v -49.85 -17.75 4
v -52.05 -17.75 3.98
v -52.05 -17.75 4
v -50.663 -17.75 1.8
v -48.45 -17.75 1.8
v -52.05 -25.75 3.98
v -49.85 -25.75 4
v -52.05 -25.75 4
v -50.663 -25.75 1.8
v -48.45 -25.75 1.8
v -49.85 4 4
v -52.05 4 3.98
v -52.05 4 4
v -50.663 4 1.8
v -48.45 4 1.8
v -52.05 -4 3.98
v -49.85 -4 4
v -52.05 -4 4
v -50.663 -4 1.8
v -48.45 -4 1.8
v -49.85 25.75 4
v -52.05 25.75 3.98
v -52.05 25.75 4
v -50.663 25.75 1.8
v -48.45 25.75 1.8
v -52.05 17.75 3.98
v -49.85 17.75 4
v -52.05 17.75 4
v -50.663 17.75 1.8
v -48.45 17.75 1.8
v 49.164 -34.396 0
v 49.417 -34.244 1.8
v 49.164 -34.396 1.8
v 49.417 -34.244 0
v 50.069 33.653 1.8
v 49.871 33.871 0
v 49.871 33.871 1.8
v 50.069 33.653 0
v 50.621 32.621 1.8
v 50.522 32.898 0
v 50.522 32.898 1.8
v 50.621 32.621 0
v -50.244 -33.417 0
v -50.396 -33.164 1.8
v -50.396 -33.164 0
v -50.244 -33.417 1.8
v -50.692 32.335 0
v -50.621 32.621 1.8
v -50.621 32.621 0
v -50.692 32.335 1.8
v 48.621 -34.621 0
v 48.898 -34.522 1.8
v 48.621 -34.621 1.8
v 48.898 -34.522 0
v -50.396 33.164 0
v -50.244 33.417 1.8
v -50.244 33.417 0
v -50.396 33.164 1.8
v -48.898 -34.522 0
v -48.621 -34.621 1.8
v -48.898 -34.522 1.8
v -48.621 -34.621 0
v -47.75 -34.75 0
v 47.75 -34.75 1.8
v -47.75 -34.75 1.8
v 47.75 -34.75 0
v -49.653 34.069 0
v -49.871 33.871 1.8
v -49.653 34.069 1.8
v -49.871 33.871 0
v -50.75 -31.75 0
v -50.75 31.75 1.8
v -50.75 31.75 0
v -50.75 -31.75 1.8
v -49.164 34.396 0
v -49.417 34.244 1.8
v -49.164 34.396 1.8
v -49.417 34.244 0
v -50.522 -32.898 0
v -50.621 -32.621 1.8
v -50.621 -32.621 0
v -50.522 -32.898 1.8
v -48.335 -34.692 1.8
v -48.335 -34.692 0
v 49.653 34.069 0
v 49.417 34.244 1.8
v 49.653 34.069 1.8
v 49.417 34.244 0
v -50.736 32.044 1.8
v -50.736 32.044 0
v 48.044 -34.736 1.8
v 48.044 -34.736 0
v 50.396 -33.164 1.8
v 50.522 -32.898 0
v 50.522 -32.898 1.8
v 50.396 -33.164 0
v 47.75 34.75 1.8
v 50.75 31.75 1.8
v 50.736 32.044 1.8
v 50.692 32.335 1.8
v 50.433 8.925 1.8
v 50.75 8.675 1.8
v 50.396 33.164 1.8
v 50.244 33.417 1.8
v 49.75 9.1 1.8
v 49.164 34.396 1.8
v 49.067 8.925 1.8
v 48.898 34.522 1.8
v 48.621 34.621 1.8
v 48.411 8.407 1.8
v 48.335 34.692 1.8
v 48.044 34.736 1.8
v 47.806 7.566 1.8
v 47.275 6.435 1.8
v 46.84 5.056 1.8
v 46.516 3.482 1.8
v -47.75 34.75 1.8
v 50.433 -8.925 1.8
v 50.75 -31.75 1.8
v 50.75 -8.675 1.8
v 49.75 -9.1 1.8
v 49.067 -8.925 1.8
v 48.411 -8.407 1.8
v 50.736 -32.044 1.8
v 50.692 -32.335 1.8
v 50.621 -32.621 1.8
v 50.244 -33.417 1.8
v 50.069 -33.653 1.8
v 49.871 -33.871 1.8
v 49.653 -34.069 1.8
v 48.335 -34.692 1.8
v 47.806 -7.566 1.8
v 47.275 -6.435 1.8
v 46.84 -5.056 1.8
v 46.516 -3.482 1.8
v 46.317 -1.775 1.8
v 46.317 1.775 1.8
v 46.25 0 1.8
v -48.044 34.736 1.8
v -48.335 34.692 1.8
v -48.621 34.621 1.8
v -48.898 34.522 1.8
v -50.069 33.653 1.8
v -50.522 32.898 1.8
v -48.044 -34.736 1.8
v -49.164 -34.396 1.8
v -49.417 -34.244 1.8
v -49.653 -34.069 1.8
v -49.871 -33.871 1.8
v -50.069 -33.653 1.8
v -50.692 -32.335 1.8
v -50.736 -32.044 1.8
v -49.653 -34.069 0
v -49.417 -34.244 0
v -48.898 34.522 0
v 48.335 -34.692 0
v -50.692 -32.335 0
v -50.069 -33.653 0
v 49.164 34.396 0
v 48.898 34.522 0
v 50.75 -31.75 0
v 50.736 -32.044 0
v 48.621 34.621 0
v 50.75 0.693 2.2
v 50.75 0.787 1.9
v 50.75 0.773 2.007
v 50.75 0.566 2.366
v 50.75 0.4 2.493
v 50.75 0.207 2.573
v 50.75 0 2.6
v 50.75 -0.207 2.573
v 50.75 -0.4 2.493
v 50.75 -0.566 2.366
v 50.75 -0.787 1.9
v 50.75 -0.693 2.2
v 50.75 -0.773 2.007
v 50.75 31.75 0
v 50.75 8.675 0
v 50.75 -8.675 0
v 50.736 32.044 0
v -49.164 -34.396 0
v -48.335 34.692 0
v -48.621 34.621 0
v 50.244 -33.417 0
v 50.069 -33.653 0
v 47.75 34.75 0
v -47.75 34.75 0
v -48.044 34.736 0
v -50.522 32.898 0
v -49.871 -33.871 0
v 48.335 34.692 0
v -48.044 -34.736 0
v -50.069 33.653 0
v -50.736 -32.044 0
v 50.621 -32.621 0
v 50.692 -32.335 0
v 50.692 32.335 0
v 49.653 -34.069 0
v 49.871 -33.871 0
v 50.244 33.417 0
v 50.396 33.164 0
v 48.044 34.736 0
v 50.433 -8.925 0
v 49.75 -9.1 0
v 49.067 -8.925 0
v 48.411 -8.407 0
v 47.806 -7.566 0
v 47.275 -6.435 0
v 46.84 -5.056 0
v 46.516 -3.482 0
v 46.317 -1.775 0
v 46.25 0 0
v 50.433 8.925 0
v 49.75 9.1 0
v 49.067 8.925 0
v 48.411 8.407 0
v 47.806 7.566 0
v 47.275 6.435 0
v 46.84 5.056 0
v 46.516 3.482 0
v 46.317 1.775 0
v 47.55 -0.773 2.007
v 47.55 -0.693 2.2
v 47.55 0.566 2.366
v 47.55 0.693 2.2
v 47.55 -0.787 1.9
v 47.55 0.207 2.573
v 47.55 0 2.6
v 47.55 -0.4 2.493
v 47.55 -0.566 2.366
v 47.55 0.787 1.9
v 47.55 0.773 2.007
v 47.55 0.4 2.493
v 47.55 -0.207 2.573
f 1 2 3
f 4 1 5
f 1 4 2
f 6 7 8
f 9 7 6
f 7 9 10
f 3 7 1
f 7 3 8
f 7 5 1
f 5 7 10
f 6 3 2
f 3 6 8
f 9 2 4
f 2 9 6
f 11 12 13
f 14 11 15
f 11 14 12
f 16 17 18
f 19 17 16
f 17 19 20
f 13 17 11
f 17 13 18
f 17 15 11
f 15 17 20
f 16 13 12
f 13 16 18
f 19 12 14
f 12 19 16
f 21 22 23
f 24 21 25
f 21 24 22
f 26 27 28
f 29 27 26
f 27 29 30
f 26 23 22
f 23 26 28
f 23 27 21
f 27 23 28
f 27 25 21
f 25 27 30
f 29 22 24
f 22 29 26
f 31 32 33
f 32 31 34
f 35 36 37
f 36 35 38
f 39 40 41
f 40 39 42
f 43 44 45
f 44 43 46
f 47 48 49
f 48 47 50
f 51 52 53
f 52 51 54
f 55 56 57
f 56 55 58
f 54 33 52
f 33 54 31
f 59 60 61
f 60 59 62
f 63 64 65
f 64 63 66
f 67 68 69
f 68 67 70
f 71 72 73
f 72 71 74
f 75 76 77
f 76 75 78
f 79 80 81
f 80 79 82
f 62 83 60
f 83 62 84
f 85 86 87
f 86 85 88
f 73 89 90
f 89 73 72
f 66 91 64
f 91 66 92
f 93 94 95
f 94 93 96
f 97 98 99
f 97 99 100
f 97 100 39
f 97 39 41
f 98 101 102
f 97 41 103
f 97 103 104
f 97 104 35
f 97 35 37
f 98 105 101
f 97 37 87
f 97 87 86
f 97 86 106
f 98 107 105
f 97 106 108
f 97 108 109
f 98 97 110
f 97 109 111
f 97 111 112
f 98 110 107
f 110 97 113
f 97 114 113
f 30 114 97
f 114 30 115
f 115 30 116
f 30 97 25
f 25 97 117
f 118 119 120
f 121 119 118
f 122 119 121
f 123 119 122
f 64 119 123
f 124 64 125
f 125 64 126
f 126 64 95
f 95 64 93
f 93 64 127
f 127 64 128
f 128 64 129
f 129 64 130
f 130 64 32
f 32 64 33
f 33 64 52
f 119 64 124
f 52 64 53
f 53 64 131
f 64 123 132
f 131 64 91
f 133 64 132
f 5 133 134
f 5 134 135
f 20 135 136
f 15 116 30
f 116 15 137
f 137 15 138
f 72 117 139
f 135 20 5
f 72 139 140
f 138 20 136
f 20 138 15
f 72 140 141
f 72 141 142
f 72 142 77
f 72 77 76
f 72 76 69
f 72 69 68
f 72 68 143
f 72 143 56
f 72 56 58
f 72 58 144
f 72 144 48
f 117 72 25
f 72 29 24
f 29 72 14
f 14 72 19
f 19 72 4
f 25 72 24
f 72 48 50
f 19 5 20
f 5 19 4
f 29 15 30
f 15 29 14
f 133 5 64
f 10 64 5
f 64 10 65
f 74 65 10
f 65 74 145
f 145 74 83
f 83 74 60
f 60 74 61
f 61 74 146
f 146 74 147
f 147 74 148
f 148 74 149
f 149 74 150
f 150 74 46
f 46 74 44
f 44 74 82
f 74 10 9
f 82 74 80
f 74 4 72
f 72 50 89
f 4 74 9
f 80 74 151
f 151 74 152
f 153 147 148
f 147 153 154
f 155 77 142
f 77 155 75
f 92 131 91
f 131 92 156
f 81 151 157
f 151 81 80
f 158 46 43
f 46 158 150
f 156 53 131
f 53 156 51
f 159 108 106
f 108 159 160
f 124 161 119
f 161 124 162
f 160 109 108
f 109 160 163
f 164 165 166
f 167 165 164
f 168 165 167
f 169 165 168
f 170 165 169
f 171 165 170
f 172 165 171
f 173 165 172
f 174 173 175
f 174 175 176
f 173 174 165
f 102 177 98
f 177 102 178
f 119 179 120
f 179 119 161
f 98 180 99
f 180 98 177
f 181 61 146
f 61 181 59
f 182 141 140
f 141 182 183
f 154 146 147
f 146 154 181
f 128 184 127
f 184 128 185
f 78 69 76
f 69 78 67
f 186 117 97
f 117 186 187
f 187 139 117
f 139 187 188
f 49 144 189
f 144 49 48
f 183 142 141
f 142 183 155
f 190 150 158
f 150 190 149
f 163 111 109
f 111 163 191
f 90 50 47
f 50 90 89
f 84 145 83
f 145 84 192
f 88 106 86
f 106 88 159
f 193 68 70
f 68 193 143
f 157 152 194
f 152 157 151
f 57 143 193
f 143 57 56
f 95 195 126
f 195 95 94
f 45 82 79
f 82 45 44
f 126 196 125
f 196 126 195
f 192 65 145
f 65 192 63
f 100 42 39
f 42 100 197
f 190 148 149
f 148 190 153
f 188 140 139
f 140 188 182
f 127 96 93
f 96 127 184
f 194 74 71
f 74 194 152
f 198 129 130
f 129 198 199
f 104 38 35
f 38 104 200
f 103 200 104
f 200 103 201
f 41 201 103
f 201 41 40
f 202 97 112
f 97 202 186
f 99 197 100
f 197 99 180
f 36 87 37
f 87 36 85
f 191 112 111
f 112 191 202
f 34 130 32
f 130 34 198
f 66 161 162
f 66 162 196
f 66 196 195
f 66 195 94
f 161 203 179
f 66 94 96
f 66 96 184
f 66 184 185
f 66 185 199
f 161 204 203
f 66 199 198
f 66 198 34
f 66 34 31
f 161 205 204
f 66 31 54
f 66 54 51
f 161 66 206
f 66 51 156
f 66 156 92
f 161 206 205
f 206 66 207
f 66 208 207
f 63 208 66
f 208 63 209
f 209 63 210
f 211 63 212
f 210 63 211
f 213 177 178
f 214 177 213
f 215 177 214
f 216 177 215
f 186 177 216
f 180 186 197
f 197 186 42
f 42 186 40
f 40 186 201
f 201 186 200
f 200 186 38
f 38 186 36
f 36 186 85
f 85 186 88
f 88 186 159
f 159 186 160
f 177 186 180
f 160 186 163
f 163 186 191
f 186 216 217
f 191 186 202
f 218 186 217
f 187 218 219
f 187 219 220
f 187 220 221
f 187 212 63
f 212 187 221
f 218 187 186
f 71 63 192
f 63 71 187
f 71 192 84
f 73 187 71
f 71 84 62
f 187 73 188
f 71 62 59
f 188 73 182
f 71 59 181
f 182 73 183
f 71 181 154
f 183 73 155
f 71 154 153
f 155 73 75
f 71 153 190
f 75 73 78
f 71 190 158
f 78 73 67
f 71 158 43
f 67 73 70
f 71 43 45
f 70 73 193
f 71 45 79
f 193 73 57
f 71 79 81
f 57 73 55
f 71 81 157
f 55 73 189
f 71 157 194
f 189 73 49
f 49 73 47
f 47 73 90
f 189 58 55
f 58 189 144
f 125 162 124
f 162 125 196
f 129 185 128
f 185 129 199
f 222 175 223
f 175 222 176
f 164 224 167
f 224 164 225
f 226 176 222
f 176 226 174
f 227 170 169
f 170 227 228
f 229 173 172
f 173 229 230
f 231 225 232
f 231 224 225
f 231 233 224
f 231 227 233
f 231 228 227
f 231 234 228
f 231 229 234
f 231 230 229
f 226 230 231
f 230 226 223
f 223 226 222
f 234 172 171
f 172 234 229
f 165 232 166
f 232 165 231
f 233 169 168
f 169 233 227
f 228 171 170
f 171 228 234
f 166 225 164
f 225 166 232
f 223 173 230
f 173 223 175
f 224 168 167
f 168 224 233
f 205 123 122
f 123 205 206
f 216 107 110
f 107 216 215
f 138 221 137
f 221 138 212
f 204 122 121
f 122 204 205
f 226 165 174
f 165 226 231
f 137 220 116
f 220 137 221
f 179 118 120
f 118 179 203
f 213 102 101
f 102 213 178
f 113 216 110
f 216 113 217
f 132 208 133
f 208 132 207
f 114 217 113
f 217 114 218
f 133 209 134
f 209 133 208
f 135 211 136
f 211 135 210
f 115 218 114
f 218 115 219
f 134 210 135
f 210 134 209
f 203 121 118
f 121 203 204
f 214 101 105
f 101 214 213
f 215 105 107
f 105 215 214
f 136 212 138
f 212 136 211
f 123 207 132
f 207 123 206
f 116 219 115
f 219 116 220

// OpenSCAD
// file: ../../sorgenti/libreria.scad
// ============================================================
// libreria.scad — forme di base riusate da tutti i pezzi
// ============================================================
include <parametri.scad>

$fn = RISOLUZIONE;

// Prisma a sezione rettangolare con angoli arrotondati.
module piastra(x, y, h, r) {
    linear_extrude(height = h)
        offset(r = r) square([x - 2*r, y - 2*r], center = true);
}

// Scatola piena con angoli verticali arrotondati (rv) e bordo
// superiore raccordato (rt). Il raccordo è approssimato a gradini
// uniti con hull(): resta liscio e si stampa senza supporti.
module scatola_arrotondata(x, y, z, rv, rt, passi = 12) {
    union() {
        piastra(x, y, z - rt, rv);
        for (i = [0 : passi - 1]) {
            a0 = 90 * i / passi;
            a1 = 90 * (i + 1) / passi;
            k0 = rt * (1 - cos(a0));  k1 = rt * (1 - cos(a1));
            h0 = rt * sin(a0);        h1 = rt * sin(a1);
            hull() {
                translate([0, 0, z - rt + h0])
                    piastra(x - 2*k0, y - 2*k0, 0.02, max(rv - k0, 0.6));
                translate([0, 0, z - rt + h1])
                    piastra(x - 2*k1, y - 2*k1, 0.02, max(rv - k1, 0.6));
            }
        }
    }
}

// Foro di passaggio per vite con svasatura della testa (testa in basso,
// si avvita dal basso verso l'alto).
module foro_svasato(h = 10, d = VITE_FORO, testa_d = VITE_TESTA_D, testa_h = 1.6) {
    translate([0, 0, -0.1]) cylinder(h = h + 0.2, d = d);
    translate([0, 0, -0.1]) cylinder(h = testa_h + 0.1, d1 = testa_d, d2 = d);
}

// Pilastrino con sede per inserto a caldo M2,5 (si inserisce dal basso).
module boss_inserto(h = 12, d = BOSS_D) {
    difference() {
        cylinder(h = h, d = d);
        translate([0, 0, -0.1]) cylinder(h = INSERTO_H + 0.1, d = INSERTO_D);
        // scarico sopra l'inserto, per la punta della vite
        translate([0, 0, INSERTO_H]) cylinder(h = h, d = VITE_D + 0.4);
    }
}

// Griglia di fori a nido d'ape dentro un cerchio di diametro d_area.
module griglia_tonda(d_area, spessore, d_foro = ALT_GRIGLIA_D, passo = 3.2) {
    n = ceil(d_area / passo) + 2;
    for (i = [-n : n], j = [-n : n]) {
        x = i * passo + (abs(j) % 2) * passo / 2;
        y = j * passo * 0.866;
        if (sqrt(x*x + y*y) <= (d_area - d_foro) / 2)
            translate([x, y, -0.1]) cylinder(h = spessore + 0.2, d = d_foro);
    }
}

// Fessura allungata (slot) con estremi arrotondati, asse X.
module fessura(lung, larg, h) {
    hull() {
        translate([-(lung - larg)/2, 0, 0]) cylinder(h = h, d = larg);
        translate([ (lung - larg)/2, 0, 0]) cylinder(h = h, d = larg);
    }
}

// Scritta in rilievo (per i provini e le etichette).
module scritta(t, dim = 6, alt = 0.6) {
    linear_extrude(height = alt)
        text(t, size = dim, halign = "center", valign = "center",
             font = "Helvetica:style=Bold");
}

// Freccia piena, punta verso +X, usata per le icone dei tasti.
module freccia(lung = 16, larg = 14, alt = 0.8) {
    gambo = larg / 5;          // mezza larghezza del gambo
    testa = lung * 0.45;       // lunghezza della punta
    linear_extrude(height = alt)
        polygon([[-lung/2, -gambo], [lung/2 - testa, -gambo],
                 [lung/2 - testa, -larg/2], [lung/2, 0],
                 [lung/2 - testa, larg/2], [lung/2 - testa, gambo],
                 [-lung/2, gambo]]);
}

// Icona "volume": tre barrette crescenti, asse X.
module icona_volume(n = 3, alt = 0.8, passo = 3.2, base = 2.0, cresc = 1.6) {
    for (i = [0 : n - 1])
        translate([i * passo, 0, 0])
            linear_extrude(height = alt)
                square([1.8, base + i * cresc], center = true);
}

// Cava a sezione rettangolare arrotondata, asse di estrusione Y.
// Utile per finestre e fessure nelle pareti verticali.
module cava_y(x, z, prof, r = 1.5) {
    rotate([90, 0, 0])
        linear_extrude(height = prof, center = true)
            offset(r = r) square([x - 2*r, z - 2*r], center = true);
}

// Pilastrino che parte dal piano del fondo e ospita un inserto a caldo
// (inserito dal basso). La punta conica in alto lo rende stampabile
// anche a scatola capovolta.
module boss_fondo(h = 12) {
    union() {
        difference() {
            cylinder(h = h, d = BOSS_D);
            translate([0, 0, -0.1]) cylinder(h = INSERTO_H + 0.1, d = INSERTO_D);
            translate([0, 0, INSERTO_H]) cylinder(h = h, d = VITE_D + 0.6);
        }
        translate([0, 0, h]) cylinder(h = BOSS_D/2, d1 = BOSS_D, d2 = 0.4);
    }
}

// Pilastrino appeso al soffitto (coperchio): l'inserto entra dal basso.
module boss_soffitto(h = 7) {
    difference() {
        translate([0, 0, -h]) cylinder(h = h, d = BOSS_D);
        translate([0, 0, -h - 0.1]) cylinder(h = INSERTO_H + 0.1, d = INSERTO_D);
    }
}

// Maschio della coda di rondine: si infila nella cava della fiancata.
// Si stampa in verticale insieme al raccoglitore, quindi senza supporti.
module coda_maschio(altezza) {
    gioco = 0.35;
    rotate([-90, 0, 0])
        linear_extrude(height = altezza)
            polygon([[0, -(CODA_FONDO - gioco)/2], [0, (CODA_FONDO - gioco)/2],
                     [CODA_PROF - 0.3, (CODA_BOCCA - gioco)/2],
                     [CODA_PROF - 0.3, -(CODA_BOCCA - gioco)/2]]);
}
// file: parametri-v2.scad
// ============================================================
// parametri-v2.scad — console da viaggio (variante v2)
// ------------------------------------------------------------
// Alternativa al cubo: si tiene con due mani, carte e dischi si
// infilano in una fessura sul bordo superiore, la collezione sta
// in un vano sul retro.
//
// Le misure del cubo (parametri.scad) restano valide per tutto
// quello che non cambia: componenti, tolleranze, viti, cursore,
// tasti, altoparlante, LED. Qui c'è solo ciò che è diverso.
// ============================================================
include <../../sorgenti/parametri.scad>

// ---------- corpo ----------
V2_X         = 180;   // larghezza: due mani
V2_Z         = 110;   // altezza
V2_Y         = 45;    // spessore
V2_RAGGIO    = 10;    // raggio degli angoli, generoso: si prende e cade
V2_PARETE    = 2.4;
V2_SPLIT     = 26;    // a che profondità si dividono i due gusci (dal fronte)

// ---------- fessura ----------
// La carta entra di lato corto e ne sporge un centimetro: così la
// spira del tag, che corre lungo il bordo della CR80, finisce tutta
// davanti all'antenna. Prima l'idea era infilarla di lato lungo per
// metà, e la lettura restava un'incognita.
V2_FESS_LARG  = CARTA_X + 2.4;      // 88,0: ci passa anche il disco Ø60
V2_FESS_SPESS = 5.4;                // carta 0,84, disco 4: passa tutto
V2_SPORGE     = 10;                 // quanto resta fuori per afferrare
V2_FESS_PROF  = CARTA_Y - V2_SPORGE + 6;  // 50: tasca sotto la fessura
V2_IMBUTO     = 2.5;                // svasatura d'ingresso, per infilare al buio

// ---------- antenna e schermo ----------
V2_PN_Y       = 9;    // dove sta il PN5180, dal fronte
V2_FERRITE_SP = 1.0;  // foglio di ferrite dietro l'antenna: senza, il
                      // lettore vedrebbe le carte nel vano sul retro

// ---------- comandi sul fronte ----------
V2_TASTO_X    = 62;   // sotto i pollici
V2_TASTO_Z    = 62;
V2_ALT_Z      = 58;   // altoparlante al centro
V2_LED_Z      = 88;
V2_CURSORE_Z  = 20;   // cursore in basso, lontano dai pollici

// ---------- vano della collezione, sul retro ----------
V2_VANO_X     = 96;   // ci stanno 6 carte in piedi, o 3 dischi
V2_VANO_Z     = 64;
V2_VANO_PROF  = 13;
V2_VANO_X0    = 30;   // spostato a destra: a sinistra c'è la batteria
V2_VANO_Z0    = 30;

// ---------- USB-C sul bordo inferiore ----------
V2_USB_X      = -50;
// main file
// ============================================================
// coperchio-vano.scad — chiude il vano della collezione
// ------------------------------------------------------------
// Tre ganci da un lato entrano nelle feritoie, poi il coperchio
// si abbassa e fa scatto sull'altro lato. Si apre con l'unghia
// dall'incavo. È grande 102 x 70: non passa dal calibro delle
// parti piccole, quindi può essere removibile senza problemi.
//
// STAMPA: appoggiato, ganci verso l'alto. Niente supporti.
// ============================================================
include <parametri-v2.scad>
include <../../sorgenti/libreria.scad>

V2_COP_SP      = 1.8;
V2_COP_BATTUTA = 3.0;
V2_GANCI       = 3;

coperchio_vano();

module coperchio_vano() {
    lx = V2_VANO_X + 2*V2_COP_BATTUTA - 0.5;
    lz = V2_VANO_Z + 2*V2_COP_BATTUTA - 0.5;
    difference() {
        union() {
            piastra(lx, lz, V2_COP_SP, 3);
            // ganci
            for (i = [0 : V2_GANCI - 1]) {
                z = -lz/2 + 13 + i * (lz - 26) / (V2_GANCI - 1);
                translate([-lx/2 + 1.2, z, V2_COP_SP - 0.01])
                    rotate([0, 0, 0])
                        hull() {
                            cube([2.2, 8, 0.02], center = true);
                            translate([-1.4, 0, 2.2]) cube([2.2, 8, 0.02], center = true);
                        }
            }
            // dentino di scatto sul lato opposto
            translate([lx/2 - 1.6, 0, V2_COP_SP])
                rotate([0, -90, 0])
                    cylinder(h = 3.2, d = 1.6, center = true, $fn = 24);
        }
        // incavo per l'unghia
        translate([lx/2 - 1, 0, -0.1])
            rotate([0, 0, 0])
                scale([1, 2.6, 1]) cylinder(h = V2_COP_SP + 0.2, d = 7, $fn = 32);
    }
}
